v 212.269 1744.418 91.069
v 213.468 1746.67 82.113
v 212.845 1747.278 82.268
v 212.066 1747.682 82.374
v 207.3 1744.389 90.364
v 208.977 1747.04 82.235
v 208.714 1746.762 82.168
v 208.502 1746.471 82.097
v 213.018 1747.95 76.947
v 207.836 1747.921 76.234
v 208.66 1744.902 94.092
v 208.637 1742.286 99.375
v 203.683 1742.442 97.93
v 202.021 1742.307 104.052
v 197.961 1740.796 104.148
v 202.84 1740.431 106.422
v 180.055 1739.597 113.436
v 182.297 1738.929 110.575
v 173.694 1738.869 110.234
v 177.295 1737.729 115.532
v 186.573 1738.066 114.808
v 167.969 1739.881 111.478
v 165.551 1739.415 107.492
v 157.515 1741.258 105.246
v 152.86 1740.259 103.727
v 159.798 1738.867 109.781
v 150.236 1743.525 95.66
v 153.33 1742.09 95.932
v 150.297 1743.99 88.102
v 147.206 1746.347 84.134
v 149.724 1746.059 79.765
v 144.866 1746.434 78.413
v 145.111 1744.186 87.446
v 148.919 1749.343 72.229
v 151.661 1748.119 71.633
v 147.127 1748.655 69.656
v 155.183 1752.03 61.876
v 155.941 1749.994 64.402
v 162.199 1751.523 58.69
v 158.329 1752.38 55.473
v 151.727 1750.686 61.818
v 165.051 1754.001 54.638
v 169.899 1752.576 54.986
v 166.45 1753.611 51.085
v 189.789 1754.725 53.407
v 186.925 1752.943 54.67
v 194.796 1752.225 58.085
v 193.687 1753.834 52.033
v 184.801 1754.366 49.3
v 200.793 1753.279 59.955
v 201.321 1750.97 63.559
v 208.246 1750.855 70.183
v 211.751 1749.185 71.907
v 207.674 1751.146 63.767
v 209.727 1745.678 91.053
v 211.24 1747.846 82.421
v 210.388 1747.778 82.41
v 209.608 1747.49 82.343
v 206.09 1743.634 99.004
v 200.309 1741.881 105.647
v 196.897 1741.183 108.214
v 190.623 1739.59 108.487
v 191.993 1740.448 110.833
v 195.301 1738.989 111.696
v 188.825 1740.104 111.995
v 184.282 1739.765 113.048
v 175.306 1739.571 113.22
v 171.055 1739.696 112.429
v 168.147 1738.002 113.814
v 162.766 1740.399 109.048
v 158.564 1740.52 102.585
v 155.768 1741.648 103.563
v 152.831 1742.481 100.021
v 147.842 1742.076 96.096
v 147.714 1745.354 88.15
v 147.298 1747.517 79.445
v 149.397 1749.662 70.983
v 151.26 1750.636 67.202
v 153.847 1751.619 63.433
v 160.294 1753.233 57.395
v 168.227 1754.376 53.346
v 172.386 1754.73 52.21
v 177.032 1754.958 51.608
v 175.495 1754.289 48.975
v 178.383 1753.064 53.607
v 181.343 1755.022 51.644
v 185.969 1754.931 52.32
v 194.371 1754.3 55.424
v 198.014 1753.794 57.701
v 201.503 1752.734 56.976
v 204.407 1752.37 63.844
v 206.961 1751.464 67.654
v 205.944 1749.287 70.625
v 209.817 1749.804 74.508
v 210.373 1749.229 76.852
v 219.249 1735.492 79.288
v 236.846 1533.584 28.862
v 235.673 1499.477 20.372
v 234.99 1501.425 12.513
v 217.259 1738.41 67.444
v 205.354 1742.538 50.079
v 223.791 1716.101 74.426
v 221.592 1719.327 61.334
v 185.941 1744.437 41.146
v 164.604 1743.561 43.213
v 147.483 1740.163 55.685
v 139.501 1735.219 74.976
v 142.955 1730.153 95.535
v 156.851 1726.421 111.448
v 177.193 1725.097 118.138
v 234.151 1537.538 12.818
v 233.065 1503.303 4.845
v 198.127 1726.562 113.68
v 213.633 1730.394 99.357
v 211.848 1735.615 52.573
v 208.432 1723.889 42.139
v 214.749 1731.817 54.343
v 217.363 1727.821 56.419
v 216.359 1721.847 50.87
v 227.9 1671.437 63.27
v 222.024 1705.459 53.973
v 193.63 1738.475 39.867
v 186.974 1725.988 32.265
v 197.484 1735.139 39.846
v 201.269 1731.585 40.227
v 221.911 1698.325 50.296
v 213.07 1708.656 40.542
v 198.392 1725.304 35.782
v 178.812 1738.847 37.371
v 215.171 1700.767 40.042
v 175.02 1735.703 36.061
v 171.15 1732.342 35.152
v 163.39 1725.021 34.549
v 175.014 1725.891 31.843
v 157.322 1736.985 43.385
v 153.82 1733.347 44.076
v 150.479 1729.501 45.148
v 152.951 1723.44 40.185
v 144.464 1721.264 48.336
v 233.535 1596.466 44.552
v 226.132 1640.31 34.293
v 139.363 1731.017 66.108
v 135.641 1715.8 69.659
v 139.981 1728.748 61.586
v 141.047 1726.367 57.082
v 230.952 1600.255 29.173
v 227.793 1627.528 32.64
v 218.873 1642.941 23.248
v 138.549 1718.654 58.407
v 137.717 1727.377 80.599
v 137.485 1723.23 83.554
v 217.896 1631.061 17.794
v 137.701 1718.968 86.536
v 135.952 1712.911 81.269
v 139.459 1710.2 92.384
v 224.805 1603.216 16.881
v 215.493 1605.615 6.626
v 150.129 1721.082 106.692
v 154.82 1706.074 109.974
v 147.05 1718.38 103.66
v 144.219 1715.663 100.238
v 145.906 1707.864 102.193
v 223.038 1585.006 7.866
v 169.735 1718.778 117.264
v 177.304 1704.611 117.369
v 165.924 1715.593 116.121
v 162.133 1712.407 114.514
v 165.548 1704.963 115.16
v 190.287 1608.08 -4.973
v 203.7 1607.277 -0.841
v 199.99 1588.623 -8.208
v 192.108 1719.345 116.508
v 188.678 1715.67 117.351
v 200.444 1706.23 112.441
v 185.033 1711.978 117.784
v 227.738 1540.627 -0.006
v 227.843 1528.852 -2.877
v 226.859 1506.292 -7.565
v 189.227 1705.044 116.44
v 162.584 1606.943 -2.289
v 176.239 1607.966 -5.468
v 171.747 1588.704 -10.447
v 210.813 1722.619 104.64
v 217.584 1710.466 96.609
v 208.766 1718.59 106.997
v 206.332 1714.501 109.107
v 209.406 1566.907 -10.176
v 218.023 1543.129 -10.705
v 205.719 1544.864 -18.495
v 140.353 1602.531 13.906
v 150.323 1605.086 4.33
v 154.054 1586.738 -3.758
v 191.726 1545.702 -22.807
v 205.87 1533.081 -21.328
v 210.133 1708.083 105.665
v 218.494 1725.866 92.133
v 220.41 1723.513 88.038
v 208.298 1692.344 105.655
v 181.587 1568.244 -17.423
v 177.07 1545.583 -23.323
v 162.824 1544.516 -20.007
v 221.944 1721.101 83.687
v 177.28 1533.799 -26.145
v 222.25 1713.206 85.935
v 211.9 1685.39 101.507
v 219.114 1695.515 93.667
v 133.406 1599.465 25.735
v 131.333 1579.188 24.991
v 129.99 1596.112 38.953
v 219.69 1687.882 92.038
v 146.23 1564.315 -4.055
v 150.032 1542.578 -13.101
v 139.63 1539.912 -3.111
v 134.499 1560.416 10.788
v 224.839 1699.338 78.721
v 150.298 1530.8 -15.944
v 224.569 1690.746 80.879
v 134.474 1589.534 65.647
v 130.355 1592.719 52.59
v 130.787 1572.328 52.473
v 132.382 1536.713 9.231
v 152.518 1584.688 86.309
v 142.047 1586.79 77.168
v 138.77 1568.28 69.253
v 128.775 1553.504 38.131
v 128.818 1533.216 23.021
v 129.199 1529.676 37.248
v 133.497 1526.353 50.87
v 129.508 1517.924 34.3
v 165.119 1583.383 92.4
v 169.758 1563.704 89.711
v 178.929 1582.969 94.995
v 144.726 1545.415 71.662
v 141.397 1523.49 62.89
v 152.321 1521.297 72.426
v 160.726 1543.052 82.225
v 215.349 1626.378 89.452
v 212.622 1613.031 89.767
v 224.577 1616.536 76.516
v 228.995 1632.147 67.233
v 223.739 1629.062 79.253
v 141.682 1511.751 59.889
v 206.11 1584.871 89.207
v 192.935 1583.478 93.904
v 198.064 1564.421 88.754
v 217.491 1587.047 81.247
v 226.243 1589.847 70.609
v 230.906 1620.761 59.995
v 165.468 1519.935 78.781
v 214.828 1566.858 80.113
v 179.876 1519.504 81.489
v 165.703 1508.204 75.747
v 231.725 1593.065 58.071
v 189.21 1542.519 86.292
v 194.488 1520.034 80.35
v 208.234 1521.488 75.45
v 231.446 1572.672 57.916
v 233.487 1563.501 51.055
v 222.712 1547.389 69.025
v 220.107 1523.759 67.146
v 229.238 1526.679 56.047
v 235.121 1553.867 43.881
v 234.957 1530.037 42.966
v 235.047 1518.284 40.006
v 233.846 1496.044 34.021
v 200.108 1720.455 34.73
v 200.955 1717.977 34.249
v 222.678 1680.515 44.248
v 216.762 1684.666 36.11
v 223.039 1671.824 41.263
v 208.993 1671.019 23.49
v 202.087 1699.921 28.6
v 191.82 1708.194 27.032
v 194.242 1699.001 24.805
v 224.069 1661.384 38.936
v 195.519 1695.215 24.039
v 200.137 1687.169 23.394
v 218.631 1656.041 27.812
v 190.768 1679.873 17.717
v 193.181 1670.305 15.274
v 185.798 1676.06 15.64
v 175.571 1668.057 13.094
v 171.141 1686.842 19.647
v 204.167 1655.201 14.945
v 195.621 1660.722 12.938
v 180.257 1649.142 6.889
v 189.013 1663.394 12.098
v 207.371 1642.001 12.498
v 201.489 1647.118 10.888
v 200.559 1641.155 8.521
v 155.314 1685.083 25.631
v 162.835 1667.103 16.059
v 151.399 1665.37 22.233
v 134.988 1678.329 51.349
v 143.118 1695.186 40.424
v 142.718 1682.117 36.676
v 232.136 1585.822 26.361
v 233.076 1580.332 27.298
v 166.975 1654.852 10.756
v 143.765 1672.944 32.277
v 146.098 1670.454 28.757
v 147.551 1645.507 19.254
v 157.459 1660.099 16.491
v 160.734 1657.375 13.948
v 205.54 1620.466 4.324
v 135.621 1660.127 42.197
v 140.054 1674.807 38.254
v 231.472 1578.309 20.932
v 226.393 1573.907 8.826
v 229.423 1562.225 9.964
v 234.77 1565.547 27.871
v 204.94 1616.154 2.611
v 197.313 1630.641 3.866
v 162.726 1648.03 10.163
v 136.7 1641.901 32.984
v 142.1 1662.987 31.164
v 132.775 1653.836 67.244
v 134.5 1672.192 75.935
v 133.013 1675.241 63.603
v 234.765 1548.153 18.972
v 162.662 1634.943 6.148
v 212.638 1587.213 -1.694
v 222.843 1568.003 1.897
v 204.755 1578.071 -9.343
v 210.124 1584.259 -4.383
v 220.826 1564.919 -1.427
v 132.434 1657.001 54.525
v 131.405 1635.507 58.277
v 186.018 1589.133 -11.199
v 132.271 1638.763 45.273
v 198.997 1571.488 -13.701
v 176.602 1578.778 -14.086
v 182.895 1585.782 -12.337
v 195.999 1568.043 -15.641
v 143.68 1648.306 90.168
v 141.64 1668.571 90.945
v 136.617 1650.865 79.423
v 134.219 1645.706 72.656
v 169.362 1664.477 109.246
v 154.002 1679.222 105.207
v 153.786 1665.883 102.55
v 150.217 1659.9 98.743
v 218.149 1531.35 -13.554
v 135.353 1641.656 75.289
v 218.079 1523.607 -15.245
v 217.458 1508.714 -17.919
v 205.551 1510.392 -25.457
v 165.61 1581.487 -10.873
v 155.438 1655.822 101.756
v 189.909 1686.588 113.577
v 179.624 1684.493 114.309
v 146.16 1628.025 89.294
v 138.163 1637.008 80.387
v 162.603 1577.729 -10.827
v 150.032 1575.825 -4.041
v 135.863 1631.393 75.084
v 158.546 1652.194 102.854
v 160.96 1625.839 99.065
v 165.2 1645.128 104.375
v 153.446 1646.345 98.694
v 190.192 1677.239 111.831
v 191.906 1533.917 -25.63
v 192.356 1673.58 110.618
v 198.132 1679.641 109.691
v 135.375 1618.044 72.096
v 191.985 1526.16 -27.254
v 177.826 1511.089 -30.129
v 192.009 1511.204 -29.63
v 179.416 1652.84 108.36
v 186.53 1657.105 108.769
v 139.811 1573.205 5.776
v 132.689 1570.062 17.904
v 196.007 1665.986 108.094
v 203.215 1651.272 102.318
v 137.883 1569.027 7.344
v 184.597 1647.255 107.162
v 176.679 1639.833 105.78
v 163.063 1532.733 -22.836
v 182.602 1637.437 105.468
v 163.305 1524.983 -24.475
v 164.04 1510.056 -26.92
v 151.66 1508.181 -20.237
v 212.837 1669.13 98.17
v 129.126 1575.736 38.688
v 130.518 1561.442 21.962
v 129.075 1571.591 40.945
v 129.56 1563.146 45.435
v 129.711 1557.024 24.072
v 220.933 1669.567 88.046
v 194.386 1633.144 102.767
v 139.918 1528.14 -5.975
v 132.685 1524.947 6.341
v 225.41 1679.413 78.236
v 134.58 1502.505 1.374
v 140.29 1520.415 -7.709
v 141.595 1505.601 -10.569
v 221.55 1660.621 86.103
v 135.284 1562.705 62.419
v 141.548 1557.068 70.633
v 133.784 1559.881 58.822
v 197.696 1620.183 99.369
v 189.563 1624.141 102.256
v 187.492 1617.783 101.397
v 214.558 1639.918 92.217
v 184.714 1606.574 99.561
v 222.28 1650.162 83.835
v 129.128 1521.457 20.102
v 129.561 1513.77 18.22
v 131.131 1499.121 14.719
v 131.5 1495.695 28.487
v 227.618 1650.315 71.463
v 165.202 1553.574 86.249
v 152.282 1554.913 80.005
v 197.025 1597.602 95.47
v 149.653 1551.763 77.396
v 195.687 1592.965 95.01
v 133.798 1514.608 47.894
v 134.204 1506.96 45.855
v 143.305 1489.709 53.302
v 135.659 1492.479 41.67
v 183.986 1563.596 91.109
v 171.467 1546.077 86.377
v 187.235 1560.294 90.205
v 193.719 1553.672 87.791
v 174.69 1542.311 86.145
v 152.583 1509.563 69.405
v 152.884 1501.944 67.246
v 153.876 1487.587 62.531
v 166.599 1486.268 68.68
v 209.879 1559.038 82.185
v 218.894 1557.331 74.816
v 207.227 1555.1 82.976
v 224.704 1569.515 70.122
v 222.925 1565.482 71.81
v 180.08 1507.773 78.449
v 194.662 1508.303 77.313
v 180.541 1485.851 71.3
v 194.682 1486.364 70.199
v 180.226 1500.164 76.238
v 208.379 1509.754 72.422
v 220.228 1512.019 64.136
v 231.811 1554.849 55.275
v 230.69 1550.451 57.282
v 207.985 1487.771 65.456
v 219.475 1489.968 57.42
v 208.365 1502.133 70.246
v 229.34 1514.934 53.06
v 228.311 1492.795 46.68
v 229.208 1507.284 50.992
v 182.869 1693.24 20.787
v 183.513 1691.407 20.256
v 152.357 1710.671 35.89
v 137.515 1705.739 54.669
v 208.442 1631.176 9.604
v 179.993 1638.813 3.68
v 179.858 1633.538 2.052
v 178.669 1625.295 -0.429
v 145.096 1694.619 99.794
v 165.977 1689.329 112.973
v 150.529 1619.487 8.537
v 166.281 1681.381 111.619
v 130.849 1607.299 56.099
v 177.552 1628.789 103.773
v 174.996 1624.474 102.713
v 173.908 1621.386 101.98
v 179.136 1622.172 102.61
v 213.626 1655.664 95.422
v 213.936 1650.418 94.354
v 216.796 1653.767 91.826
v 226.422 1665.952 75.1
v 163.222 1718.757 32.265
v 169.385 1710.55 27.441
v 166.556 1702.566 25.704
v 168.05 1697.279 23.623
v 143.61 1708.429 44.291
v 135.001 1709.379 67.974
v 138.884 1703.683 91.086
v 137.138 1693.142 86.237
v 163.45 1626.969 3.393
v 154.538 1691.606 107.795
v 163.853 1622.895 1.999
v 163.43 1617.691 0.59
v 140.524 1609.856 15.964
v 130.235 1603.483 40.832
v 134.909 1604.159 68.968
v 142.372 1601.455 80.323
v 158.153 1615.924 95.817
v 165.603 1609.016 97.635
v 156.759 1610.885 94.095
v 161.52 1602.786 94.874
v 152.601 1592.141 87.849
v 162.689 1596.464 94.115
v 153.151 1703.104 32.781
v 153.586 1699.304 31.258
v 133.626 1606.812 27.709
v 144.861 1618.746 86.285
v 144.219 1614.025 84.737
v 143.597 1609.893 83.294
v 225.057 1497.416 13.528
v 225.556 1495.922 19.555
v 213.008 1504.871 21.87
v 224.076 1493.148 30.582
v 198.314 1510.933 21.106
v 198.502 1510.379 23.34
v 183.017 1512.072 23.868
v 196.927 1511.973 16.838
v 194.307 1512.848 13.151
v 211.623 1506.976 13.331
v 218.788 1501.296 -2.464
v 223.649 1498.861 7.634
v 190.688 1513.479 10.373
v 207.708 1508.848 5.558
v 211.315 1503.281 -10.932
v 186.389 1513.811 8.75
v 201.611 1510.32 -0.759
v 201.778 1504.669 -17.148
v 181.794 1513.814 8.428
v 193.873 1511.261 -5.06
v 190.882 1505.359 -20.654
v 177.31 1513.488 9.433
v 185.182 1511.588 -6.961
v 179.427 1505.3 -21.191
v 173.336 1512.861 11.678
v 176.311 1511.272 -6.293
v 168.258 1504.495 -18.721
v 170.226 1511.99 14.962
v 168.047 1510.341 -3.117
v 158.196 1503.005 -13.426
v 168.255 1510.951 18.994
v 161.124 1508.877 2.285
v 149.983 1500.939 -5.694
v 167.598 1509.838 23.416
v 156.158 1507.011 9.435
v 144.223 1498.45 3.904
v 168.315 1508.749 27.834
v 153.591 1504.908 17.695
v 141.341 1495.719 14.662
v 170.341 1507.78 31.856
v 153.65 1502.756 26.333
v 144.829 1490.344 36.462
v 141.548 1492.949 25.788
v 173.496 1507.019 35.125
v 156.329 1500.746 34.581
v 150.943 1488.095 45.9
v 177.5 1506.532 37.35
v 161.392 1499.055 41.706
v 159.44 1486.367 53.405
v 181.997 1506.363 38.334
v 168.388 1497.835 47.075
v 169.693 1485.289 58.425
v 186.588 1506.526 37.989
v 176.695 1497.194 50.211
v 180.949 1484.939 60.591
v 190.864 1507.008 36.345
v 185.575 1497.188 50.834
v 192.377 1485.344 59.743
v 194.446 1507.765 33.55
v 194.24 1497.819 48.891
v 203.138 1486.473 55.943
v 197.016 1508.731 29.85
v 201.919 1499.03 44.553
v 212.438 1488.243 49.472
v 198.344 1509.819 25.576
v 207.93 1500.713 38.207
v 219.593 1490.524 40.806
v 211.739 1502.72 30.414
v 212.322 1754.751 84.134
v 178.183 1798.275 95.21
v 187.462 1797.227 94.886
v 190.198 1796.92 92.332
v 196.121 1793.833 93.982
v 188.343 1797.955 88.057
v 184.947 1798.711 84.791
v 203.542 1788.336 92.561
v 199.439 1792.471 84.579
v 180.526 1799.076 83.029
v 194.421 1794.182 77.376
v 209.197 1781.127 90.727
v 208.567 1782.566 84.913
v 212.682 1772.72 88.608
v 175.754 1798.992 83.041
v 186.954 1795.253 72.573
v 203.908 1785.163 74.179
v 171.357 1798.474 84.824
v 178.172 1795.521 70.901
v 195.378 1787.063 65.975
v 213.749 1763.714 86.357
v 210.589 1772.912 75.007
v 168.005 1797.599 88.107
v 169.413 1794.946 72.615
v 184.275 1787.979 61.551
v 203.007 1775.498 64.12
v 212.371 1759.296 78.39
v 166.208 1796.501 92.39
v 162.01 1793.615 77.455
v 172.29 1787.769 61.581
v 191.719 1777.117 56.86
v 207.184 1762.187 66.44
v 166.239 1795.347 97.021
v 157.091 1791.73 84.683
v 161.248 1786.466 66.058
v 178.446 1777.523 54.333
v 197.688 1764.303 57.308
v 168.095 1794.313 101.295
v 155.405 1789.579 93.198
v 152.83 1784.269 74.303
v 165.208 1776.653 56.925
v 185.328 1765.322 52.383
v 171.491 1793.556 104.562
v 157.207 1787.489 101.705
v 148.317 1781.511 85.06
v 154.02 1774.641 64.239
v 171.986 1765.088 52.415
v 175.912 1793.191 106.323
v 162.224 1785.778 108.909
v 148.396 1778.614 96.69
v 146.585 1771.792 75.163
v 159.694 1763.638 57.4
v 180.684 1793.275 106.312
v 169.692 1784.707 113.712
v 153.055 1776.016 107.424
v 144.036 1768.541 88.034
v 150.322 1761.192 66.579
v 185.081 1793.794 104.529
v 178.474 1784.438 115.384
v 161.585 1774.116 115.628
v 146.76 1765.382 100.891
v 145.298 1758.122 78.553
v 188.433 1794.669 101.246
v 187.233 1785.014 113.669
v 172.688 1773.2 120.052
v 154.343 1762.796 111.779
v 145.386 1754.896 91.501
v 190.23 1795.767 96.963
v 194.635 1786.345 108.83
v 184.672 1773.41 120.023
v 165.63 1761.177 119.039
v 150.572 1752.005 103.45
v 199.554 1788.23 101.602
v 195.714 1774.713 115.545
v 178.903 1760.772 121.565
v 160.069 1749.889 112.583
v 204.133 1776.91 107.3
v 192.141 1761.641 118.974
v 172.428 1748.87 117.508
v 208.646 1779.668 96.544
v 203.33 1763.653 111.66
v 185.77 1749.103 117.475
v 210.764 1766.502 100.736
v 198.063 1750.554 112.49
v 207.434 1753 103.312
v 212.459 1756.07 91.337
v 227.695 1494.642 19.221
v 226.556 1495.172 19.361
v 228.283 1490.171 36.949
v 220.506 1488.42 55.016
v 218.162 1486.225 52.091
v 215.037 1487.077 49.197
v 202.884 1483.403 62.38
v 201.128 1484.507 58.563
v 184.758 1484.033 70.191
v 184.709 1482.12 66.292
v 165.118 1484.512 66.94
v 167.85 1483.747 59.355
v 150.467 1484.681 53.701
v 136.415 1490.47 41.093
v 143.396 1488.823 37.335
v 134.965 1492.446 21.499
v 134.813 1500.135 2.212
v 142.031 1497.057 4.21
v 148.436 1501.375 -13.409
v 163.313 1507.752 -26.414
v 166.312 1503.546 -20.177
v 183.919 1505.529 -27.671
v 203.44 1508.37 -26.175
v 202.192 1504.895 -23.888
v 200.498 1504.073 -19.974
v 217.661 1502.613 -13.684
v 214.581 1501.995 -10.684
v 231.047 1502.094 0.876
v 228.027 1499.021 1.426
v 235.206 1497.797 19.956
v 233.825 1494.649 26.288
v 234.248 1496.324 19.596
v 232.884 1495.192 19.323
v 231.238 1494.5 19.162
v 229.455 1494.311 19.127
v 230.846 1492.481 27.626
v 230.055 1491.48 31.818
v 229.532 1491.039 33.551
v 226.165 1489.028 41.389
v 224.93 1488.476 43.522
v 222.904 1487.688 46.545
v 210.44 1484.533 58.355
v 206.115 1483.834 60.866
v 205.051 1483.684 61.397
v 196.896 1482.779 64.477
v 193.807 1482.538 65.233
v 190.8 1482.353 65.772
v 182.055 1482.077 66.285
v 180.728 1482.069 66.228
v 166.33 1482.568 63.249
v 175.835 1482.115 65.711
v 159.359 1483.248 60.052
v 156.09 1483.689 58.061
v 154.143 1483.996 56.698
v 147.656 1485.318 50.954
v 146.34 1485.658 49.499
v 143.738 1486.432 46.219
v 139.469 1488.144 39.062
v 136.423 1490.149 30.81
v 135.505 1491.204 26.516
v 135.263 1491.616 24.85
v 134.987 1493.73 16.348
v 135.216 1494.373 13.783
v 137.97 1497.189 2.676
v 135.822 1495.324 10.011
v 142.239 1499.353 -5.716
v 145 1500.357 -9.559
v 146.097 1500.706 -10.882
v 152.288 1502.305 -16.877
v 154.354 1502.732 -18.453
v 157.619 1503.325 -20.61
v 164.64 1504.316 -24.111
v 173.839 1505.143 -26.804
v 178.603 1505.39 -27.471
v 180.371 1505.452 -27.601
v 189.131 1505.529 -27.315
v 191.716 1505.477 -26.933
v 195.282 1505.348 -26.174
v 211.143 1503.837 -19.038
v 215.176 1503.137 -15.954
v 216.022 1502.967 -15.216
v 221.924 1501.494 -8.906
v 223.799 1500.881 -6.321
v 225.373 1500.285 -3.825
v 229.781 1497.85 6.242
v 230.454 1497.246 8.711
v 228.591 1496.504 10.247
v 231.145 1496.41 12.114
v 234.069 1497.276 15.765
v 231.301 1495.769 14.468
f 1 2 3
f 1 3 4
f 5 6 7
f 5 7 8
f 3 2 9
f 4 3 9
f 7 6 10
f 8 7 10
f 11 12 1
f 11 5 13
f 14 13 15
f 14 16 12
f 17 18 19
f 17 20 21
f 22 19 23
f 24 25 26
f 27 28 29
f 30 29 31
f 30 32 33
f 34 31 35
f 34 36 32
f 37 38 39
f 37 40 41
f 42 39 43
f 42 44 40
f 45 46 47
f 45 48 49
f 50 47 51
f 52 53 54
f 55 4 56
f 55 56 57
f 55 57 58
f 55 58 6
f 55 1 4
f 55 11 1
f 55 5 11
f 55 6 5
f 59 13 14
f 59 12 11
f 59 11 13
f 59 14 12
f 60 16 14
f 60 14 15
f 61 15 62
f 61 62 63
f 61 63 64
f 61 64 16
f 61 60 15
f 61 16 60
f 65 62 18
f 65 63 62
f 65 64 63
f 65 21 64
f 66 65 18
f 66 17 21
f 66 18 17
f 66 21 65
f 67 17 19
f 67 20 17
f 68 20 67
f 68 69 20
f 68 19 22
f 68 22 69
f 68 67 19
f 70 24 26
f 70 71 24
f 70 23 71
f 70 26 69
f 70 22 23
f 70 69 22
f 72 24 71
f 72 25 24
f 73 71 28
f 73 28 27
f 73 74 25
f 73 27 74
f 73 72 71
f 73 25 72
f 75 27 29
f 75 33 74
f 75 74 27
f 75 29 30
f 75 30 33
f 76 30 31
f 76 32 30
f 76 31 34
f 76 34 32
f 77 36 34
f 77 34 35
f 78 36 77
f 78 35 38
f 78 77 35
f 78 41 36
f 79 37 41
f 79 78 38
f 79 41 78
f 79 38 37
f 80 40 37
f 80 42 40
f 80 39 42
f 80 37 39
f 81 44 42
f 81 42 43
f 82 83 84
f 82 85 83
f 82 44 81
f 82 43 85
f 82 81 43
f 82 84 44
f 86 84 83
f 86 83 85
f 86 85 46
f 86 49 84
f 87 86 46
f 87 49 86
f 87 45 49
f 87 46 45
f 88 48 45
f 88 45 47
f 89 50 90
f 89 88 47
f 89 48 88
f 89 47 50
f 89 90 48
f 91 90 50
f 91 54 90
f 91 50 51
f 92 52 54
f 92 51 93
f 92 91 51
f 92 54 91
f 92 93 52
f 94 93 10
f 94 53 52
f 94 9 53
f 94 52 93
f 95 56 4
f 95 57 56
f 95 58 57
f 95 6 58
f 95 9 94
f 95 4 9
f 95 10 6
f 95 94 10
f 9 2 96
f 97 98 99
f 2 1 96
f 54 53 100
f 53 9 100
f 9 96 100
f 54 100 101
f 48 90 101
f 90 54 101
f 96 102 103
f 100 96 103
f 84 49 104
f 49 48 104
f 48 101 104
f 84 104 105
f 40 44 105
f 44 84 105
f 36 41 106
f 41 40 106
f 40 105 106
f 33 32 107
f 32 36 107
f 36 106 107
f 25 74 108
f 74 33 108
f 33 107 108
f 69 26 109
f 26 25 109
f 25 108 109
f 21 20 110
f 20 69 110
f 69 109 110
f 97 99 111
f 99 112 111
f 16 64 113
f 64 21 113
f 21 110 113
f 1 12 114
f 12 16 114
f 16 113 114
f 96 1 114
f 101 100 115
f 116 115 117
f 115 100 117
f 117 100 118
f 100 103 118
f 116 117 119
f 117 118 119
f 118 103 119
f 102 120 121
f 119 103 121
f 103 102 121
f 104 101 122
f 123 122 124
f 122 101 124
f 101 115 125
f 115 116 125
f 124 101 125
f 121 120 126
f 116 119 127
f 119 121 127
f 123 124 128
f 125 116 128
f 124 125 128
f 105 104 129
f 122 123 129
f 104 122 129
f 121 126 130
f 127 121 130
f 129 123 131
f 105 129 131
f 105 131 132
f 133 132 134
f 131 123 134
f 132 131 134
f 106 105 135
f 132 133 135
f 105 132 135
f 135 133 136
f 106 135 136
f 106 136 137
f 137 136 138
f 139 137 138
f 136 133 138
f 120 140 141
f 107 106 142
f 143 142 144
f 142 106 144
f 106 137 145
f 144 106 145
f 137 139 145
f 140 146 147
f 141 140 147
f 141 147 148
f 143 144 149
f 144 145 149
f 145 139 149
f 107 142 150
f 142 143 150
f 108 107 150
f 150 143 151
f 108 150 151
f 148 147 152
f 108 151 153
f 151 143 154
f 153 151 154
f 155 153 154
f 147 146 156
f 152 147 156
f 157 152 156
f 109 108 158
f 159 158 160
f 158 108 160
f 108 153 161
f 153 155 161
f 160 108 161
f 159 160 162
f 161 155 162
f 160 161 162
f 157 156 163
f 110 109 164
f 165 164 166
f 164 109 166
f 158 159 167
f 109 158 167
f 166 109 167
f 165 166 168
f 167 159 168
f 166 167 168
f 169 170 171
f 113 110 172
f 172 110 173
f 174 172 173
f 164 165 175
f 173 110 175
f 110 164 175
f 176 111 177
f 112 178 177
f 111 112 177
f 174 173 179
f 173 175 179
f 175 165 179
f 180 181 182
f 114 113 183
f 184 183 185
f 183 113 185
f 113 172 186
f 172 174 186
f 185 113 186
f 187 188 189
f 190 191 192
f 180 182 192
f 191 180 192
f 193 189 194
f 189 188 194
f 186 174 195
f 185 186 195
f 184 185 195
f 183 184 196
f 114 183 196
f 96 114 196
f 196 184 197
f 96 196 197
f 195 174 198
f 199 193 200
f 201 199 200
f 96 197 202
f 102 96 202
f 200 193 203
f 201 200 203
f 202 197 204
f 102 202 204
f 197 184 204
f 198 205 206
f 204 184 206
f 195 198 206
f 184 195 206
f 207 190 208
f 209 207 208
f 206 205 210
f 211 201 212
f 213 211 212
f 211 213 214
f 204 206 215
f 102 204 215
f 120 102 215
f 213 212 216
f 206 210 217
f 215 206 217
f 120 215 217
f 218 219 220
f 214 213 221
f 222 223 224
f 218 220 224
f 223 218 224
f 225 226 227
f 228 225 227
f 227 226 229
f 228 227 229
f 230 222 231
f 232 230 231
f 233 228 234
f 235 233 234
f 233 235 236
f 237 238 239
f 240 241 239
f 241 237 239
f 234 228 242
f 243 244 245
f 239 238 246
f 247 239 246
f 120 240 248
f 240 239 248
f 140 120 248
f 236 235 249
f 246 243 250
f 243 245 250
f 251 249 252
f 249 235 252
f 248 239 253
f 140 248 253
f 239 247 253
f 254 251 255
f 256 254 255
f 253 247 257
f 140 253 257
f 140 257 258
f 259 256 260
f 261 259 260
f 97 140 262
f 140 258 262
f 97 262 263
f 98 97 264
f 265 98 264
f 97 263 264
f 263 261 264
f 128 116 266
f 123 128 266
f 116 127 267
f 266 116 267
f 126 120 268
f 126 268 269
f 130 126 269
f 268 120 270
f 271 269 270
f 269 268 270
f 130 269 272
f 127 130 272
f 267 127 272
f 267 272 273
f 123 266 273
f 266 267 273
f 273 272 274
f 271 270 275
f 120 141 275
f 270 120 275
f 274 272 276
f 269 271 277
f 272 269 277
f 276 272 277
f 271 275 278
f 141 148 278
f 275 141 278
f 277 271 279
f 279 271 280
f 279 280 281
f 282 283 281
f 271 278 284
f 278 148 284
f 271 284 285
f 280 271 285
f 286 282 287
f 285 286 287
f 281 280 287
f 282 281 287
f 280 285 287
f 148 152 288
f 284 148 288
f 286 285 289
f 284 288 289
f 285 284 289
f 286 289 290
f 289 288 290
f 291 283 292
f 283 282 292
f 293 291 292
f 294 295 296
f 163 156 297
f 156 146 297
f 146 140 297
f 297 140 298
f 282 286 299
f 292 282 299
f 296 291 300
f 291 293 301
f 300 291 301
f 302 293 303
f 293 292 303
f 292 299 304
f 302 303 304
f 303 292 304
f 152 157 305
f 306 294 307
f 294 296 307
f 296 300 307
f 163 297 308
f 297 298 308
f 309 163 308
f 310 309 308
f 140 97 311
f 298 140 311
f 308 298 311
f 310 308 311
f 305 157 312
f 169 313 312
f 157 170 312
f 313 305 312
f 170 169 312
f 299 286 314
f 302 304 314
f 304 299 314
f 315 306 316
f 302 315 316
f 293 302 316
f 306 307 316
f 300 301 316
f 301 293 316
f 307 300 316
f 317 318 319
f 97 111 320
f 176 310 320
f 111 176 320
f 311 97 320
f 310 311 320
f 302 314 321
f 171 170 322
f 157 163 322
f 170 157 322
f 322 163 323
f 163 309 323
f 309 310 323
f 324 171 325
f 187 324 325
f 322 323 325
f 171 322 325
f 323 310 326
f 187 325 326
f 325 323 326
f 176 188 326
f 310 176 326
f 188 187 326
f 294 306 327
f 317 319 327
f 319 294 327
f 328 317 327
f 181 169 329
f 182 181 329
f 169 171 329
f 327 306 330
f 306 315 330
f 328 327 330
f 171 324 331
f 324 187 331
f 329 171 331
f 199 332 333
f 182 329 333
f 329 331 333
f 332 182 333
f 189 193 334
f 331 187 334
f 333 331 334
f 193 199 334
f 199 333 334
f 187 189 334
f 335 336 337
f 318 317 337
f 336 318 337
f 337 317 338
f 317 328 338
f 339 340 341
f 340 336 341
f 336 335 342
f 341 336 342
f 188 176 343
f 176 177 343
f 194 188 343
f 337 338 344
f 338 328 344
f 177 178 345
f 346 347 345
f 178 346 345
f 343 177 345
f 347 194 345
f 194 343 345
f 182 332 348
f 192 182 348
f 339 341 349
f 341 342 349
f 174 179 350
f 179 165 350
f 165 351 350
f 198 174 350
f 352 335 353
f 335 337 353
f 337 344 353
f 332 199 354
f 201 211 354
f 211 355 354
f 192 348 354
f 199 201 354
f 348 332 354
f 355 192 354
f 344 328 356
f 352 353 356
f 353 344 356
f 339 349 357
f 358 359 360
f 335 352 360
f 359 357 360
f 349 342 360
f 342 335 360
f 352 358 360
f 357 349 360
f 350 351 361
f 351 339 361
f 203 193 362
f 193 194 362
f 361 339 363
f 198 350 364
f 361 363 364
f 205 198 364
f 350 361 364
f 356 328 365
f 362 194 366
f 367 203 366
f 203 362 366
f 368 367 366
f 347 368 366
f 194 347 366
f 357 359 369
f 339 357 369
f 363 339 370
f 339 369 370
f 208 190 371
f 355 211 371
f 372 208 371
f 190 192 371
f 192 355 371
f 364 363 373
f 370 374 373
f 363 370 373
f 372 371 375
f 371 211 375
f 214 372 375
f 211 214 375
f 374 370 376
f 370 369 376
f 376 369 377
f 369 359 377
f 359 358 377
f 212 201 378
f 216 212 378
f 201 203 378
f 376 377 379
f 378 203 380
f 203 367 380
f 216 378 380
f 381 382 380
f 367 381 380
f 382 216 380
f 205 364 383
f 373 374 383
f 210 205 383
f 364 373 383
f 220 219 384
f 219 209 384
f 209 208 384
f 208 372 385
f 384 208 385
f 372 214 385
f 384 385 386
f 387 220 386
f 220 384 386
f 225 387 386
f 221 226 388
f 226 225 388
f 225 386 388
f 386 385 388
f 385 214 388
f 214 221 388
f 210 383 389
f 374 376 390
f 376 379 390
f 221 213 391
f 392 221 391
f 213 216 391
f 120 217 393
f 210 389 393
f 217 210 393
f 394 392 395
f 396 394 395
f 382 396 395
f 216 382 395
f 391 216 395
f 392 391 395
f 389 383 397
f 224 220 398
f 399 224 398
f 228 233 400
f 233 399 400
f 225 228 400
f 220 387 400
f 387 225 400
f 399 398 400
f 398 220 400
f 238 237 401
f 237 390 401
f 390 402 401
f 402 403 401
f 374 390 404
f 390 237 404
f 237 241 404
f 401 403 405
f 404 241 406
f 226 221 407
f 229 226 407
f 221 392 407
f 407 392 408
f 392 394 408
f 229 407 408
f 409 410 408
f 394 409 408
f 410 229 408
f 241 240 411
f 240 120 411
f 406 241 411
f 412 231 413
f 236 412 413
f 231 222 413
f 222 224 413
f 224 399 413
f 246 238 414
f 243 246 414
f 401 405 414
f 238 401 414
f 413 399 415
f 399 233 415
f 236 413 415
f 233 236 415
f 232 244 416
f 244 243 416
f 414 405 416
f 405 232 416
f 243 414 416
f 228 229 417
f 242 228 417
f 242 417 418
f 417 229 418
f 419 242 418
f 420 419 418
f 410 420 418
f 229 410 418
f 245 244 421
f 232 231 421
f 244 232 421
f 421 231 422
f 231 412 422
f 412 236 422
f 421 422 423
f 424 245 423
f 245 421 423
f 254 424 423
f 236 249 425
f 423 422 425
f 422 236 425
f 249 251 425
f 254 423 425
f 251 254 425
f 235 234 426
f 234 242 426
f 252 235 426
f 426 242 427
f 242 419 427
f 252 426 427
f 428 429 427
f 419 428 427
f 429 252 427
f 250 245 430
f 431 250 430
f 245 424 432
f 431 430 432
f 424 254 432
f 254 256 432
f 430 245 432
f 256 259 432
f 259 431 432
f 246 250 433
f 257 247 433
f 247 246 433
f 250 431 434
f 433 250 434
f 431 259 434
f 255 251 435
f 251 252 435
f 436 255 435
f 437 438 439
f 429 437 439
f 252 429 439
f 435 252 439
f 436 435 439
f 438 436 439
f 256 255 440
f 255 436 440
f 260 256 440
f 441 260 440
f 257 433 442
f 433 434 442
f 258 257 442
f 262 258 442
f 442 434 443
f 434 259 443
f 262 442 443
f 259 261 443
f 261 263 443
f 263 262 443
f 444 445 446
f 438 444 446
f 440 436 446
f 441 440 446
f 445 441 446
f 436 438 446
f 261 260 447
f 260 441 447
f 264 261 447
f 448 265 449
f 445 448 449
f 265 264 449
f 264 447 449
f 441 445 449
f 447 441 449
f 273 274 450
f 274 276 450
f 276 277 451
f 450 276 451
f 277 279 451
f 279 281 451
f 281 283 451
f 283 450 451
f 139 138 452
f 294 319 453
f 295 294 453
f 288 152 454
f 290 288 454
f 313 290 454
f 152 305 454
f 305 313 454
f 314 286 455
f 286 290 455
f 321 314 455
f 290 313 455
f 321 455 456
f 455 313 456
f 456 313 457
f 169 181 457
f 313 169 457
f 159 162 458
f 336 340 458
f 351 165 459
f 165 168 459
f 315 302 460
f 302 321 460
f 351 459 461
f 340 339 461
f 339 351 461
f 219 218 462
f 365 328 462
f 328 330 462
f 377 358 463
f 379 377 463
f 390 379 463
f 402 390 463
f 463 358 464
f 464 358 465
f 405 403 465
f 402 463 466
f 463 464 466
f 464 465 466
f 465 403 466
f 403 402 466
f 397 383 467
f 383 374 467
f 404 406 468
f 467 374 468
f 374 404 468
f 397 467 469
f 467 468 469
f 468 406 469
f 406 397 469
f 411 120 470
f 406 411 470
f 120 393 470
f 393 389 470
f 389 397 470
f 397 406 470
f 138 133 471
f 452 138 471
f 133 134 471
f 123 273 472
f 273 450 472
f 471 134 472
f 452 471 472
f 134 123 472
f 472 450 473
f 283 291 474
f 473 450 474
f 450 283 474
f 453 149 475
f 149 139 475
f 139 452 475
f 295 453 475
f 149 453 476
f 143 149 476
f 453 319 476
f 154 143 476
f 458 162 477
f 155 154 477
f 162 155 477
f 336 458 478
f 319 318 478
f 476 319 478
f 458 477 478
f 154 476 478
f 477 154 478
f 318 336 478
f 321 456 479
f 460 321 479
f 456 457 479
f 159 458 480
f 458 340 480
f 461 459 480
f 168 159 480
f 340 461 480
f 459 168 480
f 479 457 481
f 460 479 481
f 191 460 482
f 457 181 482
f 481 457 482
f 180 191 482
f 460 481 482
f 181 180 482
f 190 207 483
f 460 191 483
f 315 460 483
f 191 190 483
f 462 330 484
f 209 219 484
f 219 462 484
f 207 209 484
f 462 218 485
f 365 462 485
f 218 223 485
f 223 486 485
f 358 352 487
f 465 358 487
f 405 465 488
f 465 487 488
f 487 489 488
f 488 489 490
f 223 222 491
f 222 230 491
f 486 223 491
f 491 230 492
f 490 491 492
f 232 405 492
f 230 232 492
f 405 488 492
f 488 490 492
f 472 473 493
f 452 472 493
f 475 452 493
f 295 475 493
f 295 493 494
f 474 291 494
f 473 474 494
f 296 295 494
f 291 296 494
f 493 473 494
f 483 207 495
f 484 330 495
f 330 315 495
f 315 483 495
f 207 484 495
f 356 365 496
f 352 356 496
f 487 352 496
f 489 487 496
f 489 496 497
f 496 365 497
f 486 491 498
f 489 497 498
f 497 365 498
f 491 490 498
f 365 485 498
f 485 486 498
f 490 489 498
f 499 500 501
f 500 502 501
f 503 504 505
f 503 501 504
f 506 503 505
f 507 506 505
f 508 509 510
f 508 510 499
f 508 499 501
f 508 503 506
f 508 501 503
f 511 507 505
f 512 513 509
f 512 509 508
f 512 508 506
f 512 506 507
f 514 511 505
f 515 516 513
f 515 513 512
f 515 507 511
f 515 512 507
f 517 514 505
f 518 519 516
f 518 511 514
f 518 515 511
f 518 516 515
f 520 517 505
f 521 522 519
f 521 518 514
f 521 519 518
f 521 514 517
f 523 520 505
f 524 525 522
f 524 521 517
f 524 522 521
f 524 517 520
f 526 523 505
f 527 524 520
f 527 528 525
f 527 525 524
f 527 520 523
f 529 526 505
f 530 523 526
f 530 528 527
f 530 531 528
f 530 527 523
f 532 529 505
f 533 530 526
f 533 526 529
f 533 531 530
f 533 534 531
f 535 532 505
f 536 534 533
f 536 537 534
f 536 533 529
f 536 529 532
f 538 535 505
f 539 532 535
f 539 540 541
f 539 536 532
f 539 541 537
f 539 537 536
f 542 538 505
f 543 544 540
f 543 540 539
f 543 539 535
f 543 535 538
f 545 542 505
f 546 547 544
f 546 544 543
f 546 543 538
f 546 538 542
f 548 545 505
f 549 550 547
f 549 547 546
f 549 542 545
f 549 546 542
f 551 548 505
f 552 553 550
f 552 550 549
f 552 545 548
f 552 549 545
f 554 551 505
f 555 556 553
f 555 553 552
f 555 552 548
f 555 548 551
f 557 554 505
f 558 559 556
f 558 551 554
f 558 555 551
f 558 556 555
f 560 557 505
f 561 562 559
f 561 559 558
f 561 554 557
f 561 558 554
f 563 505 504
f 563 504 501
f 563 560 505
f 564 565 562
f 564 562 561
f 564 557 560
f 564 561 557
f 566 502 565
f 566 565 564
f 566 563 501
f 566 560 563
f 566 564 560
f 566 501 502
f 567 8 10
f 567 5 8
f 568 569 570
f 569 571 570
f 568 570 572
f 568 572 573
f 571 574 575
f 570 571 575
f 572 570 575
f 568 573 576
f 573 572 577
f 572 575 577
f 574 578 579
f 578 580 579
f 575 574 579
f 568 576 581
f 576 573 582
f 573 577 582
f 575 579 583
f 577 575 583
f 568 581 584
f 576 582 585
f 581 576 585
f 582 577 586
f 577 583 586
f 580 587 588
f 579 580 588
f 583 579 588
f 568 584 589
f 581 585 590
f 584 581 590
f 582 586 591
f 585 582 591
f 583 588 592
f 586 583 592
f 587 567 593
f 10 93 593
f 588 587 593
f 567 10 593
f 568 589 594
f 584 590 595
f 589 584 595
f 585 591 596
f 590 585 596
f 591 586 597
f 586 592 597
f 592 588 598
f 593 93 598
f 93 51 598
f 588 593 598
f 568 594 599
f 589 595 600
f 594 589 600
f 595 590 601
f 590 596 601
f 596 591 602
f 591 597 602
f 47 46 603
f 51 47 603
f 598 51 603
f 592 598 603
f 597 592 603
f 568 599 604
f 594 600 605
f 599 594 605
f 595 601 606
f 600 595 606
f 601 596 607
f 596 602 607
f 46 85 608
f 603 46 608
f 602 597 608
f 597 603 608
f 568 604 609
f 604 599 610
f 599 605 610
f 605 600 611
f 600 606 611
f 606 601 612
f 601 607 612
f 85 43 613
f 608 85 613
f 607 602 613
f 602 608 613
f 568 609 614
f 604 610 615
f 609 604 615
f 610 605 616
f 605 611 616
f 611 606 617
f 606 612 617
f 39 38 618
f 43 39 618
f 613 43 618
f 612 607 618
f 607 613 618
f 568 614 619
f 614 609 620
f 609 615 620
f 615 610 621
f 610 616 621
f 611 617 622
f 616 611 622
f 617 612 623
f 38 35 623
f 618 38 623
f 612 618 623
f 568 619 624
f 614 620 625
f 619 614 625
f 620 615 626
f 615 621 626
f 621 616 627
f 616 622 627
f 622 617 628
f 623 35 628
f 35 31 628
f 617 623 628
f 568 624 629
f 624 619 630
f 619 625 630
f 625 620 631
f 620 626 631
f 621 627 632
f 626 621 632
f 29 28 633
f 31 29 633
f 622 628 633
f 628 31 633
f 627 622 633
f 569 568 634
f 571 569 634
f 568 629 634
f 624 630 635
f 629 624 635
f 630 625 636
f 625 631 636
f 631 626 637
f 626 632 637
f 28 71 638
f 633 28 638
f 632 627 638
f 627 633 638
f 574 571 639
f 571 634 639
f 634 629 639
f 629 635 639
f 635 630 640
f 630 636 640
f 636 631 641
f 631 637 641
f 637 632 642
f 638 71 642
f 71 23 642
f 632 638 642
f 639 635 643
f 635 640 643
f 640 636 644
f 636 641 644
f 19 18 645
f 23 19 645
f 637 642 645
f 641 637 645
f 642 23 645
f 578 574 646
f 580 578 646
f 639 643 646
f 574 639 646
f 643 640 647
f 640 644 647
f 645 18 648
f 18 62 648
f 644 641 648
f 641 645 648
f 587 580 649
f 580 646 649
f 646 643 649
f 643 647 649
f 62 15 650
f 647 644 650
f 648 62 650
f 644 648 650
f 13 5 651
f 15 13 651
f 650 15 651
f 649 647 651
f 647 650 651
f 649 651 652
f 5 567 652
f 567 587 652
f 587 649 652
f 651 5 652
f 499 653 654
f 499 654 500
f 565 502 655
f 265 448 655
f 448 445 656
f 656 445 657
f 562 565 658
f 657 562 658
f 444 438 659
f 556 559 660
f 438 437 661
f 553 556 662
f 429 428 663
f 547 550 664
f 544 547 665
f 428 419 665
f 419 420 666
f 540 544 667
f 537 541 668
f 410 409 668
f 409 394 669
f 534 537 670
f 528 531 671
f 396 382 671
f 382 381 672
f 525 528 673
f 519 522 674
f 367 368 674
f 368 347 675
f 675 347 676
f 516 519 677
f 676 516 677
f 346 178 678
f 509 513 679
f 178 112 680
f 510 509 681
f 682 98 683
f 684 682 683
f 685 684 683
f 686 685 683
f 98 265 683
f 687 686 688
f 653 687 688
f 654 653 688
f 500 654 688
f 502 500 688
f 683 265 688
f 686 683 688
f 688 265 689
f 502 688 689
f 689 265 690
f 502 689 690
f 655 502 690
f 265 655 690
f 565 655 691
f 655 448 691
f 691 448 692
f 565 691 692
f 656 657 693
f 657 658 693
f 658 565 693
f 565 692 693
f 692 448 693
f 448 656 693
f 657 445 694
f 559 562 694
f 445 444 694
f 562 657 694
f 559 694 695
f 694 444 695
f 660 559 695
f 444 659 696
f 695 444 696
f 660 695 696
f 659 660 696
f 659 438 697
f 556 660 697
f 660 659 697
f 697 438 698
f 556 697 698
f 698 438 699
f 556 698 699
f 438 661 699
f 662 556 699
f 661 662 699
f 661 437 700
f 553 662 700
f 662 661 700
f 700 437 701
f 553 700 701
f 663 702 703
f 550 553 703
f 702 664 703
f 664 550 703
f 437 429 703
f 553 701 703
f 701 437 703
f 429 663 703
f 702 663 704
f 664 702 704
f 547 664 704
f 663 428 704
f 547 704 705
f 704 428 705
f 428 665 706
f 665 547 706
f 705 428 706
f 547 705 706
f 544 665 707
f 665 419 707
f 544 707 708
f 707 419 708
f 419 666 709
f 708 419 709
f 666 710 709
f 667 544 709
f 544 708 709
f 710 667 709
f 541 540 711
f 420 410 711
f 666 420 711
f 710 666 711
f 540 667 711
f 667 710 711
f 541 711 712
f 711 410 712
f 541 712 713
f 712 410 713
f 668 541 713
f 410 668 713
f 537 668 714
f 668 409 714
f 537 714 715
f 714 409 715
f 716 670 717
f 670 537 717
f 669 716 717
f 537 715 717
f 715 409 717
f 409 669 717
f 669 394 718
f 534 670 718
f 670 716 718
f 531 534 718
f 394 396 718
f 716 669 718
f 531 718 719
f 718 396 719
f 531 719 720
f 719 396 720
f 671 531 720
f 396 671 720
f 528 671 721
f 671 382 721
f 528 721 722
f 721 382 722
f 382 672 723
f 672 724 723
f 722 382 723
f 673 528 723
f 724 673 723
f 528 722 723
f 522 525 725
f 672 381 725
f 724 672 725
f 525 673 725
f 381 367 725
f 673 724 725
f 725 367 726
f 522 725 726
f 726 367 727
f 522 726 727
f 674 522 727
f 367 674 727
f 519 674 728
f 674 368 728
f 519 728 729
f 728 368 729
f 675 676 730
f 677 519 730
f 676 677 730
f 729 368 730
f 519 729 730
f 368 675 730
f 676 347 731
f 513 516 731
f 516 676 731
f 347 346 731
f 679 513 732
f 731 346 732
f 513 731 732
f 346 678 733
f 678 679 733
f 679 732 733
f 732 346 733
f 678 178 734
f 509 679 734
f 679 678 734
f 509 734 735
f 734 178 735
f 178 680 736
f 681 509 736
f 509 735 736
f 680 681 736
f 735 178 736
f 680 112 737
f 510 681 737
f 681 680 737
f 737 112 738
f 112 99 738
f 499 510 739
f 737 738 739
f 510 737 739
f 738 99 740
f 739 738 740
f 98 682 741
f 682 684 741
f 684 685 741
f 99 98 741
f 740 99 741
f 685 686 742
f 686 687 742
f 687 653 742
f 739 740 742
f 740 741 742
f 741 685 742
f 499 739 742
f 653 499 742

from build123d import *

# Parameters (mm, degrees)
FILLET059_R             = 6
FILLET060_R             = 3
BODY037_ROLL_ANGLE      = -179.856248
BODY037_PITCH_ANGLE     = -13.99509
BODY037_PLACEMENT_ANGLE = 90.967664


with BuildPart() as part:
    # Sketch125 → Revolution065 (revolve)
    with BuildSketch(Plane.XY):
        with BuildLine():
            Line((15.9442, 0), (306.848053, 0))
            add(Edge.make_bspline(
                [(306.848053, 0), (324.317413, 42.311157), (231.745069, 46.553256), (127.654996, 54.056504), (-18.918443, 56.908137), (15.9442, 0)],
                knots=[0, 0, 0, 0, 0.333333, 0.666667, 1, 1, 1, 1], degree=3))
        make_face()
    revolve(axis=Axis((0, 0, 0), (1, 0, 0)))

    # Sketch126 → Groove058 (revolve, cut)
    with BuildSketch(Plane.XY):
        with BuildLine():
            Line((-60, 0), (60, 0))
            ThreePointArc((60, 0), (0, 60), (-60, 0))
        make_face()
    revolve(axis=Axis((0, 0, 0), (1, 0, 0)), mode=Mode.SUBTRACT)

    # Fillet059
    fillet059_edges = [part.edges().sort_by_distance(p)[0] for p in [
        (33.106232, -50.039758, 0),
    ]]
    fillet(fillet059_edges, radius=FILLET059_R)

    # Sketch127 → Groove059 (revolve, cut)
    with BuildSketch(Plane.XY):
        with BuildLine():
            Line((285, 0), (355, 0))
            ThreePointArc((355, 0), (320, 35), (285, 0))
        make_face()
    revolve(axis=Axis((0, 0, 0), (1, 0, 0)), mode=Mode.SUBTRACT)

    # Fillet060
    fillet060_edges = [part.edges().sort_by_distance(p)[0] for p in [
        (304.668851, -31.463564, 0),
    ]]
    fillet(fillet060_edges, radius=FILLET060_R)

    # Sketch127 → Revolution066 (revolve)
    with BuildSketch(Plane.XY):
        with BuildLine():
            Line((285, 0), (355, 0))
            ThreePointArc((355, 0), (320, 35), (285, 0))
        make_face()
    revolve(axis=Axis((0, 0, 0), (1, 0, 0)))


with BuildPart() as part_1:
    # Body037 roll: moved
    add(part.part.rotate(Axis((0, 0, 0), (1, 0, 0)), BODY037_ROLL_ANGLE))


with BuildPart() as part_2:
    # Body037 pitch: moved
    add(part_1.part.rotate(Axis((0, 0, 0), (0, 1, 0)), BODY037_PITCH_ANGLE))


with BuildPart() as part_3:
    # Body037 placement: moved
    add(part_2.part.moved(Location((184, 1453.861755, 9.357312))).rotate(Axis((184, 1453.861755, 9.357312), (0, 0, 1)), BODY037_PLACEMENT_ANGLE))


solid = part_3.part
